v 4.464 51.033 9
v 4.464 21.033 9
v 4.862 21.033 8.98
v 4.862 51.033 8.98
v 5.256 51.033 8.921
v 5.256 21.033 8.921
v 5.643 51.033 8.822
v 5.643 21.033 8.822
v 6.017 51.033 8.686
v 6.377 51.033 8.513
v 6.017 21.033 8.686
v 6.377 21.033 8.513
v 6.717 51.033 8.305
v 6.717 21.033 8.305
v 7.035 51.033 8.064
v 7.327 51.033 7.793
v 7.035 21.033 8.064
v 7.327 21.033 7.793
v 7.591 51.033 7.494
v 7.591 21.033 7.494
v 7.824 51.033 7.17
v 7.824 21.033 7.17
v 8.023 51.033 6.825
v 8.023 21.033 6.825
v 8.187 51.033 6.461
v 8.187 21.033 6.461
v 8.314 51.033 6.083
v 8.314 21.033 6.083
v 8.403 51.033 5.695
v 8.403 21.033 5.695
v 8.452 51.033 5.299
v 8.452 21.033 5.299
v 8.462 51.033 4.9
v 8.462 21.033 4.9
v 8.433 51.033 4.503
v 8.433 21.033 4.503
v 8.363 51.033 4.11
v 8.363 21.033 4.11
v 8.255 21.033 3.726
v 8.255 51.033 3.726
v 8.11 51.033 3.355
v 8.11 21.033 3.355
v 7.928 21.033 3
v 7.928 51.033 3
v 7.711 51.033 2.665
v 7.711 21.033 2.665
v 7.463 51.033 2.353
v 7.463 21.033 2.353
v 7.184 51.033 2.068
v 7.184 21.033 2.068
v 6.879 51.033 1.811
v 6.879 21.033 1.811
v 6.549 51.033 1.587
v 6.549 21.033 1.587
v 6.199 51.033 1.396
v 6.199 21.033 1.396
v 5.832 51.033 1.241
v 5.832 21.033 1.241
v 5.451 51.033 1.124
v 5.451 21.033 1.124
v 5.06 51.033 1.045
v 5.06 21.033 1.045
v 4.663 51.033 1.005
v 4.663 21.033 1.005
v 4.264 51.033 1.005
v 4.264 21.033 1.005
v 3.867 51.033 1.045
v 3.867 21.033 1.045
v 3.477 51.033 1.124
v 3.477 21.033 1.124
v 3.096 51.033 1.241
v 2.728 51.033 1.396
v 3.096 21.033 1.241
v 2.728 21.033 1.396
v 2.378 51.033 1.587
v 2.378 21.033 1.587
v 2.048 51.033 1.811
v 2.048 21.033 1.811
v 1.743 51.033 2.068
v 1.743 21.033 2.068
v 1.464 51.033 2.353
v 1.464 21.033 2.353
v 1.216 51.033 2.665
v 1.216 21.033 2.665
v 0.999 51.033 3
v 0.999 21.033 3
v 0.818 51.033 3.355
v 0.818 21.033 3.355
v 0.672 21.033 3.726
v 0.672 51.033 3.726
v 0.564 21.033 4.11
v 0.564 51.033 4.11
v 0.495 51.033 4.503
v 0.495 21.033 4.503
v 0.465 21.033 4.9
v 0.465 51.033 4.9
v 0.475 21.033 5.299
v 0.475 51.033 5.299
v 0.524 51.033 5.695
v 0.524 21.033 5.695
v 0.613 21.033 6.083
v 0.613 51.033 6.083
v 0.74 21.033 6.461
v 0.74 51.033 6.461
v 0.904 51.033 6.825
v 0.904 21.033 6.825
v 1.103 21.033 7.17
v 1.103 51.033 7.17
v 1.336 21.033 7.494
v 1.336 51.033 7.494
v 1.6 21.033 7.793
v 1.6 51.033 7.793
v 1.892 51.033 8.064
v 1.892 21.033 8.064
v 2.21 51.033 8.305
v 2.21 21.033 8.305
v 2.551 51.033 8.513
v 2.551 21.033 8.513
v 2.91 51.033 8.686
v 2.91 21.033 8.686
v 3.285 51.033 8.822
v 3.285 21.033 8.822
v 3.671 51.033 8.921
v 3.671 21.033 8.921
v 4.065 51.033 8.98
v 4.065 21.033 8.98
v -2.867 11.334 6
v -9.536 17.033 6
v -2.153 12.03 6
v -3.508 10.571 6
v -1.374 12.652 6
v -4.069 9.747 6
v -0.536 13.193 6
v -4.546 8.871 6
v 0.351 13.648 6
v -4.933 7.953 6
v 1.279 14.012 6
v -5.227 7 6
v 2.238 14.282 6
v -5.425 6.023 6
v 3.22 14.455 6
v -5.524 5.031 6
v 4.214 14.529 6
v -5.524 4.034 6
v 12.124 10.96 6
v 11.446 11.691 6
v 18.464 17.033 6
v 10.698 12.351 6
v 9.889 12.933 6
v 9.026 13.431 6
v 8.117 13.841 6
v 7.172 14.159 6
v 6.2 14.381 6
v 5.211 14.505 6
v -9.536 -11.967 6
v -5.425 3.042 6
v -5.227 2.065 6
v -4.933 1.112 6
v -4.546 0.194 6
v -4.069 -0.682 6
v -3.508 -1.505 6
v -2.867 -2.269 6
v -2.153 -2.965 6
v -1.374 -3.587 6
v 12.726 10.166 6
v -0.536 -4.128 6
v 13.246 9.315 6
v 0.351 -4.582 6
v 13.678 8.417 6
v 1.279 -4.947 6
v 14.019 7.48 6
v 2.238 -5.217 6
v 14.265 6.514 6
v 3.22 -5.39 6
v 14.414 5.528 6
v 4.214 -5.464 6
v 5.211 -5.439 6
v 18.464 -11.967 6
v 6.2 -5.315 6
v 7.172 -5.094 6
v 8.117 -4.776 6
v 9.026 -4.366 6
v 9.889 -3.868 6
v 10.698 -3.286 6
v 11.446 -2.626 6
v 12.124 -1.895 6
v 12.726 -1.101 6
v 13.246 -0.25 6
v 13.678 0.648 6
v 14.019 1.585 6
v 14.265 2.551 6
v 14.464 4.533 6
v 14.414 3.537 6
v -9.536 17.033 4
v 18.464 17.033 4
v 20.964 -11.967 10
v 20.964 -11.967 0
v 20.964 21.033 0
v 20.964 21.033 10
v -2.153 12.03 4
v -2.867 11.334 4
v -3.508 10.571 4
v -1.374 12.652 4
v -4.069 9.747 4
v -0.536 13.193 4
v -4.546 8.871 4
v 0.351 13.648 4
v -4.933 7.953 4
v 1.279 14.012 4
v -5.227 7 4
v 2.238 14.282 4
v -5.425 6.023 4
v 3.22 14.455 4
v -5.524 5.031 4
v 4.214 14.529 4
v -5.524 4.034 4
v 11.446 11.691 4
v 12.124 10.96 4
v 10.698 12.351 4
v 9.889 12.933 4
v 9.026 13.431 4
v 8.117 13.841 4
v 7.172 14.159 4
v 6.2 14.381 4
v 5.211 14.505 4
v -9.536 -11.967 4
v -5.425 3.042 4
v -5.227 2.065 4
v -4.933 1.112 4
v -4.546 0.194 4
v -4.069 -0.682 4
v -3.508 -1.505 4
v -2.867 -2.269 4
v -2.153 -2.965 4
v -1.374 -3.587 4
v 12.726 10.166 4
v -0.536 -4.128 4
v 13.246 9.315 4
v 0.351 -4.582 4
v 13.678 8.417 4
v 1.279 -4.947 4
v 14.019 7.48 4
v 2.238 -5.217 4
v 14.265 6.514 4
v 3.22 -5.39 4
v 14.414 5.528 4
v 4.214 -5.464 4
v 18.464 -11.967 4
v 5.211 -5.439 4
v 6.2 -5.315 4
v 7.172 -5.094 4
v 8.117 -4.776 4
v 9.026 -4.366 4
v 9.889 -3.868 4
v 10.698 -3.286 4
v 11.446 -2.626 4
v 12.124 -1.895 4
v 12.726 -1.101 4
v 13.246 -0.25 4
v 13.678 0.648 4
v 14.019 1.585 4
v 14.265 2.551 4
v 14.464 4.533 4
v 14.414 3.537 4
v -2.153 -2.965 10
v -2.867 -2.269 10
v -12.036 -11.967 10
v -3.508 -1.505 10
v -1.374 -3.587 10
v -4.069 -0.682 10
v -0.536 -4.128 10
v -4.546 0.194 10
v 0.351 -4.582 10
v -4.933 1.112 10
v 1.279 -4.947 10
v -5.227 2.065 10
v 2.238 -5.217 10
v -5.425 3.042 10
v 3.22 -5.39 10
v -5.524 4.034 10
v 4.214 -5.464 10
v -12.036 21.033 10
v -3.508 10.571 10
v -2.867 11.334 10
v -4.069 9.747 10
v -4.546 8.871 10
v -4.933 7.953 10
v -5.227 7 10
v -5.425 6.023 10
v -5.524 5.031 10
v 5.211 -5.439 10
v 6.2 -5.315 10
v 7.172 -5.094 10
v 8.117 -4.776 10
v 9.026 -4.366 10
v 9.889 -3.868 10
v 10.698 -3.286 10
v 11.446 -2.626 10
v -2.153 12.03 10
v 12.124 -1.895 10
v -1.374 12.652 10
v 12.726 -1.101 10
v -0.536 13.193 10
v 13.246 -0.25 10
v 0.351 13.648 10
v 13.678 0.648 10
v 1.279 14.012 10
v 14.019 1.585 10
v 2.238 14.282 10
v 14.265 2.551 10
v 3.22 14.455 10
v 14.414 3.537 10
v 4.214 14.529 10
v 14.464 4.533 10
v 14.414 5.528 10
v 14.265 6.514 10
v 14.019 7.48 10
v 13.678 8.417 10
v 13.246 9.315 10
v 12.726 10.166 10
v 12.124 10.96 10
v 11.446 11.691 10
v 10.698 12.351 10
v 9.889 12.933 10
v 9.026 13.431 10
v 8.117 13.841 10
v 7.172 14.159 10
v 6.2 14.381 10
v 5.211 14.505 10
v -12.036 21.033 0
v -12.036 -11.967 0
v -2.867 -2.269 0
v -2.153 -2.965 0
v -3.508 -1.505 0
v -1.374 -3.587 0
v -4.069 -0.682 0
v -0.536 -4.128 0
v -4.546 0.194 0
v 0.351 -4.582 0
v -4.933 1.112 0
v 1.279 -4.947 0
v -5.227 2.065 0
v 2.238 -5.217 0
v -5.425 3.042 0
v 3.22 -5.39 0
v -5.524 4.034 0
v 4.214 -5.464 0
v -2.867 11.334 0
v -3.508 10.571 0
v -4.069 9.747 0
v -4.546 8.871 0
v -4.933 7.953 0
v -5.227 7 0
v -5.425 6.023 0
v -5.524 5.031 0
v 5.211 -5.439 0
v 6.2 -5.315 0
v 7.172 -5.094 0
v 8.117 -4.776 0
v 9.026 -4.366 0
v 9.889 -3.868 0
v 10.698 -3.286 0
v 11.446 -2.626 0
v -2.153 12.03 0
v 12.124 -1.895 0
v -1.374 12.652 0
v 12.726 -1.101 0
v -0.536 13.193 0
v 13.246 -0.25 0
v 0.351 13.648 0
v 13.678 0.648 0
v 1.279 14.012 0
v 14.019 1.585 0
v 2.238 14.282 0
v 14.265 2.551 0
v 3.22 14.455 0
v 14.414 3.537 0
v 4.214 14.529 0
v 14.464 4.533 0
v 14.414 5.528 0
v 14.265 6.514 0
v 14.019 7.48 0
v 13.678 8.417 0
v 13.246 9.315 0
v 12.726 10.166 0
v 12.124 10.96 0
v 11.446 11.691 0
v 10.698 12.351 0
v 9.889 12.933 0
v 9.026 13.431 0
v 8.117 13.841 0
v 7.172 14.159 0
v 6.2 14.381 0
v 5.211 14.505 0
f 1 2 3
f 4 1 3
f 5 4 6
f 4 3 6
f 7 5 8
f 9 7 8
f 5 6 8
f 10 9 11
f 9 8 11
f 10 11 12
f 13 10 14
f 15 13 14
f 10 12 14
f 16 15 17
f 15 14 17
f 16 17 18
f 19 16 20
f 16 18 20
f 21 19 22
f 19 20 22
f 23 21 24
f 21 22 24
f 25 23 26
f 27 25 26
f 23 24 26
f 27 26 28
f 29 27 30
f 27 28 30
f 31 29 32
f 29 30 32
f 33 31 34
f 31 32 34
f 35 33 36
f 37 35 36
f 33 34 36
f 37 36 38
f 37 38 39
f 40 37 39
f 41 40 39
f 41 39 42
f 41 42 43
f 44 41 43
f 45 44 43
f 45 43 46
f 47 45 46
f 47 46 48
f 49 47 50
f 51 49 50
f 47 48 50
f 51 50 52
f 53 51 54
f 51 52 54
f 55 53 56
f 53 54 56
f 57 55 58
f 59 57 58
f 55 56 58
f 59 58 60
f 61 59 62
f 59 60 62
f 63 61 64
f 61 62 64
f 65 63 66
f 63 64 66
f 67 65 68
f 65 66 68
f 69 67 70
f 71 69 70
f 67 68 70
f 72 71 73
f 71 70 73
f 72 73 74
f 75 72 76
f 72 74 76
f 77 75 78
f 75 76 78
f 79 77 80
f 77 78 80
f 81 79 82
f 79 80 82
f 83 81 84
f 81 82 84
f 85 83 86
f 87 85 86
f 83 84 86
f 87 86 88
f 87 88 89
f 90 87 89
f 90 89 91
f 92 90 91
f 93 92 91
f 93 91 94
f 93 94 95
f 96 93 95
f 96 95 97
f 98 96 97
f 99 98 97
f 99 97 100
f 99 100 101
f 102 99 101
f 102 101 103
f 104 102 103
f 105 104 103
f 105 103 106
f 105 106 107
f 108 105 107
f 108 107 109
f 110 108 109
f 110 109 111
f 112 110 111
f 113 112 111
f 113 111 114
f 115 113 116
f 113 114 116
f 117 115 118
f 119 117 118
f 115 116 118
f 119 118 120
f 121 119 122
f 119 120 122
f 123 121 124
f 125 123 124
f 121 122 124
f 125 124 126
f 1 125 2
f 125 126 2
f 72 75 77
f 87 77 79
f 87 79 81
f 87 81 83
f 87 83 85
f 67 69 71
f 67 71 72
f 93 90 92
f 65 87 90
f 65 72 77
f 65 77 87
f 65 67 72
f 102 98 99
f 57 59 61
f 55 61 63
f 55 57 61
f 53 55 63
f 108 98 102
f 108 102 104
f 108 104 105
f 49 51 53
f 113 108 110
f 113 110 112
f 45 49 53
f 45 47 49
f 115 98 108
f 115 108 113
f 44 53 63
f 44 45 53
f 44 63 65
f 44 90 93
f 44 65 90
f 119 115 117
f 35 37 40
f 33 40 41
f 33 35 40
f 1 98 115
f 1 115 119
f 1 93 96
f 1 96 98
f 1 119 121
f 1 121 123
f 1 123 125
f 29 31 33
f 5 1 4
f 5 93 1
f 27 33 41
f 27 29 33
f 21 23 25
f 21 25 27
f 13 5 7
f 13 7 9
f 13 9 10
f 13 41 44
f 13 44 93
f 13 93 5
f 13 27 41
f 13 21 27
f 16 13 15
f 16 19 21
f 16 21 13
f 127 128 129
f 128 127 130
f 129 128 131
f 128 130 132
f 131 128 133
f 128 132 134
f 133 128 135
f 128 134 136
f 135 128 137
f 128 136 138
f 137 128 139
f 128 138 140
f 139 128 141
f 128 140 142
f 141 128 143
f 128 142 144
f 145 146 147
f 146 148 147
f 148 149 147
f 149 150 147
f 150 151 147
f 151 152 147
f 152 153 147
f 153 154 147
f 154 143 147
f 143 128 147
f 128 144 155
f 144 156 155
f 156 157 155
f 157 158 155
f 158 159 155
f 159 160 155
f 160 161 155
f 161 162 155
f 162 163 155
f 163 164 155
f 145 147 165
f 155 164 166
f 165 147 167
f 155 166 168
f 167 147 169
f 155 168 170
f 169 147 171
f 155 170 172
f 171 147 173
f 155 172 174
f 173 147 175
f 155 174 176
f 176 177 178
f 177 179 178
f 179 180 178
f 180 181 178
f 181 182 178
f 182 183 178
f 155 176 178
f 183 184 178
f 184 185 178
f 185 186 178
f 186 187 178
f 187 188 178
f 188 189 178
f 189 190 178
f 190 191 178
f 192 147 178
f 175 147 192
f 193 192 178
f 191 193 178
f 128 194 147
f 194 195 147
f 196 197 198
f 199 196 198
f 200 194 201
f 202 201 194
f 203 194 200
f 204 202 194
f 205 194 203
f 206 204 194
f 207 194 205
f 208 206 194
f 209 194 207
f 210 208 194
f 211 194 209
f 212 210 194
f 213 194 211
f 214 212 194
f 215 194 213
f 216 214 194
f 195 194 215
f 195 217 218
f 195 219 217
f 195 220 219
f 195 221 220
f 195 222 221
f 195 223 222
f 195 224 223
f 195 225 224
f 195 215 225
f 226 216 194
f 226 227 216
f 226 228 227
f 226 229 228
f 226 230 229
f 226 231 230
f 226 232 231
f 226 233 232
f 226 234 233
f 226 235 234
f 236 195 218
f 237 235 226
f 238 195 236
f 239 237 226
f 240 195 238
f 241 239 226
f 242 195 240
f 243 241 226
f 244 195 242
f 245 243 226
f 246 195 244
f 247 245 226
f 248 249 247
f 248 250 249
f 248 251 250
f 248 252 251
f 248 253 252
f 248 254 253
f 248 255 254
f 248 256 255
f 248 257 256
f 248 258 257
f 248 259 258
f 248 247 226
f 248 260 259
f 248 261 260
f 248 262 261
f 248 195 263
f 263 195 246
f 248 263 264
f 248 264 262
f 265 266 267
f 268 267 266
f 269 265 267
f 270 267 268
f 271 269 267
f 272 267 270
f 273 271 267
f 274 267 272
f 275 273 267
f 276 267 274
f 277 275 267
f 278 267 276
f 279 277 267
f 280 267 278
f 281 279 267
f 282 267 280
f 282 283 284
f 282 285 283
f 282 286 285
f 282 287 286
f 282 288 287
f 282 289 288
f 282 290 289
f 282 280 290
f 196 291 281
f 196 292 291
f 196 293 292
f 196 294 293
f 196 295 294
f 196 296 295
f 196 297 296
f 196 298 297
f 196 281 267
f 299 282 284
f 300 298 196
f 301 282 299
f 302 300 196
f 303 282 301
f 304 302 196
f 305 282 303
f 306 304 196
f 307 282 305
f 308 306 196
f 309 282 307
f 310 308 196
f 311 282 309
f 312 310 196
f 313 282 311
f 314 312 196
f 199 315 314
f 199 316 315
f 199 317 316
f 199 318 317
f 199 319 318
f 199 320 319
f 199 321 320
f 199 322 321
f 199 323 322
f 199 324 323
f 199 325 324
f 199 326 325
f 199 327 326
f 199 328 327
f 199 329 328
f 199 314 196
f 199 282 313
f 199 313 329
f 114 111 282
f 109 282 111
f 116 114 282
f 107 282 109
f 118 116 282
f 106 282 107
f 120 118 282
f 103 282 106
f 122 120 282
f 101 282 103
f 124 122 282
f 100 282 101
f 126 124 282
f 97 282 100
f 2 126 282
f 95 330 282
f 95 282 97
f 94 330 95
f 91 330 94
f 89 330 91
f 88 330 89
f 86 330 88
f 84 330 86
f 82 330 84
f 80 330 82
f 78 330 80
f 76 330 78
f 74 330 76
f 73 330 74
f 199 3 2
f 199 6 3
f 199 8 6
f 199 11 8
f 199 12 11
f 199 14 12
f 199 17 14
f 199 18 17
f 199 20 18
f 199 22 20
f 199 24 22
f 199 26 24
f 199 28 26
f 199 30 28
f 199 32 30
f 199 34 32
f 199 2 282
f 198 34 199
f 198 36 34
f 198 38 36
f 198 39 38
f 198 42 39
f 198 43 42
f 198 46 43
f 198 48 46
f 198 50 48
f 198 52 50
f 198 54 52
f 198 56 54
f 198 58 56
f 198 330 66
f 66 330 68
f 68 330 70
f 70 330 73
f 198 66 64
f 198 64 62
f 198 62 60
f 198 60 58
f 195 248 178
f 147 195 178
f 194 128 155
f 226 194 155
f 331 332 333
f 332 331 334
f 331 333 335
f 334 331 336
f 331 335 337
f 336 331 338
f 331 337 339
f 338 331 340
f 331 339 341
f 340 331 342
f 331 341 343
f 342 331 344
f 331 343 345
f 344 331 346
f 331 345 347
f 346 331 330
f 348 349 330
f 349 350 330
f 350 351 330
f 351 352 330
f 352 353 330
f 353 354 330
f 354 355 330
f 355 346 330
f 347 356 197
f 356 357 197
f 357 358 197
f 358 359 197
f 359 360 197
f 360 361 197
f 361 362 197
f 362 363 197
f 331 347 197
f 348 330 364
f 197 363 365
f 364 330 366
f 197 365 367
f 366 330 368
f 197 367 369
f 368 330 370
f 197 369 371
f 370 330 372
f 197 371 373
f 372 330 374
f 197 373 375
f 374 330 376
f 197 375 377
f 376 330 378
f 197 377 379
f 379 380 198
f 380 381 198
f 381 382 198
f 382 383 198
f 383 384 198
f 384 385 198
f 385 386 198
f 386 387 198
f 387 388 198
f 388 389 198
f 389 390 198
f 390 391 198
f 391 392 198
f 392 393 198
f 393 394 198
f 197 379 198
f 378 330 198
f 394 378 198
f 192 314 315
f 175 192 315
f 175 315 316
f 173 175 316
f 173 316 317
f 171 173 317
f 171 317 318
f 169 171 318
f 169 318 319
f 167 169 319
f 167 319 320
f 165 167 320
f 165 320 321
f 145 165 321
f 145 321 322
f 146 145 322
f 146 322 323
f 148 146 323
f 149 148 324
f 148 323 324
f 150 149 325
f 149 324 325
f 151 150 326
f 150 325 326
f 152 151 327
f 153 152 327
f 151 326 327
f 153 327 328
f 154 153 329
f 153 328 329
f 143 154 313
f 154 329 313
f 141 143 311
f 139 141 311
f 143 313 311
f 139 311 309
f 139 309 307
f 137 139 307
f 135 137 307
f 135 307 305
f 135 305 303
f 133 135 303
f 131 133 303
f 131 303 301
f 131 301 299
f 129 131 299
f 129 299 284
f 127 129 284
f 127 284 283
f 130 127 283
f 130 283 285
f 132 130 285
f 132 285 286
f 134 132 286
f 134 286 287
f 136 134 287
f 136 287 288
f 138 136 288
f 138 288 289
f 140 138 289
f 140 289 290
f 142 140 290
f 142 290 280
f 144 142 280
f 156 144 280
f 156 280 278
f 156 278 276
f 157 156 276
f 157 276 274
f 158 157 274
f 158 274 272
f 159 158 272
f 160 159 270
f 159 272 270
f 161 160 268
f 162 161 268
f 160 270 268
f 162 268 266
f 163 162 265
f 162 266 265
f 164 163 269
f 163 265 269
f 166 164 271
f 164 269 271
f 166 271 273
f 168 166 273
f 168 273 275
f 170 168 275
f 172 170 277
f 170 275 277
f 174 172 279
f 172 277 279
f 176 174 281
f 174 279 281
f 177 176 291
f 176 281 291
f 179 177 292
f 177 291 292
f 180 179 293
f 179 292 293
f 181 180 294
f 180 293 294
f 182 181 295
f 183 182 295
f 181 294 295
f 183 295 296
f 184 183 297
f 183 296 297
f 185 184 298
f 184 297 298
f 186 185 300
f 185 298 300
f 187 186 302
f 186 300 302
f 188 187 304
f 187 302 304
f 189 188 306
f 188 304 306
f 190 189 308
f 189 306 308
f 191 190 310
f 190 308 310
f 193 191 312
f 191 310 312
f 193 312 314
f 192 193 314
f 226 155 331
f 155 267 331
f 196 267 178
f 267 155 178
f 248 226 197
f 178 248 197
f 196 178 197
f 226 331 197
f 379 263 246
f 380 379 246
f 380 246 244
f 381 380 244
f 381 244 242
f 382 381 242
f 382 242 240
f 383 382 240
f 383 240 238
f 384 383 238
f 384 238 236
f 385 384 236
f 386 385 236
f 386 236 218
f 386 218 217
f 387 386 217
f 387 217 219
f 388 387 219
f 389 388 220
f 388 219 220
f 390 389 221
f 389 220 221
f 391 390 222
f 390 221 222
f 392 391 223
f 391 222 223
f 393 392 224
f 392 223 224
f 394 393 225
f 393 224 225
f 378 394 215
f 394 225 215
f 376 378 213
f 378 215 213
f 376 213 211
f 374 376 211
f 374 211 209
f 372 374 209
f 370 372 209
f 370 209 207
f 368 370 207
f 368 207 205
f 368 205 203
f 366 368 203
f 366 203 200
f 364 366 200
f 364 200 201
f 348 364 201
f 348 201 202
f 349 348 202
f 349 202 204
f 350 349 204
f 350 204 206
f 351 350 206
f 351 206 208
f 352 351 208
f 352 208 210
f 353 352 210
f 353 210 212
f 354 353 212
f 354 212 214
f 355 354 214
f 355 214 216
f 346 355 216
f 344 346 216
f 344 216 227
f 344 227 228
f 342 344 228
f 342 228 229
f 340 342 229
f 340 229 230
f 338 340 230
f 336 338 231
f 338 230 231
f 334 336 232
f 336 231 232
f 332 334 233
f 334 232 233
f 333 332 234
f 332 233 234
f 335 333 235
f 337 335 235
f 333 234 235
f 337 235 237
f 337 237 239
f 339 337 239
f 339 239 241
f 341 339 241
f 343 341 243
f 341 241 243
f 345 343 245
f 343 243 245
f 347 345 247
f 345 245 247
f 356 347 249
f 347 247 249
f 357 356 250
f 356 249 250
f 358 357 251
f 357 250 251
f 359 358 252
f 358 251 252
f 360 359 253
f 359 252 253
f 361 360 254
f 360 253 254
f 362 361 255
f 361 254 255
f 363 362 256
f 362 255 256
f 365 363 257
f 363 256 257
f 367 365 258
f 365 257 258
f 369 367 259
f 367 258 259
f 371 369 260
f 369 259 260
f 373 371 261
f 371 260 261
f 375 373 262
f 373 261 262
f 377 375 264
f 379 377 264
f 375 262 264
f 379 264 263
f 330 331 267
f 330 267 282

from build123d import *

# Parameters (mm, degrees)
SKETCH1_W                 = 33
SKETCH1_H                 = 33
BOSS_EXTRUDE1_DEPTH       = 10
SHELL1_T                  = -4
SHELL1_THICKNESS_2_FACE_W = 2
SHELL1_THICKNESS_2_FACE_H = 29
SHELL1_THICKNESS_2_DEPTH  = 1.5
SHELL1_THICKNESS_3_FACE_W = 29
SHELL1_THICKNESS_3_FACE_H = 2
SHELL1_THICKNESS_3_DEPTH  = 1.5
SKETCH3_R                 = 10
CUT_EXTRUDE1_DEPTH        = 10
SKETCH5_R                 = 4
BOSS_EXTRUDE2_DEPTH       = 30


with BuildPart() as part:
    # Sketch1 → Boss-Extrude1 (new body)
    with BuildSketch(Plane.XY):
        with Locations((4.463597679, 4.532591876)):
            Rectangle(SKETCH1_W, SKETCH1_H)
    extrude(amount=BOSS_EXTRUDE1_DEPTH)

    # Shell1
    shell1_openings = [part.faces().sort_by_distance(p)[0] for p in [
        (4.463597679, -11.967408124, 5),
    ]]
    offset(amount=SHELL1_T, openings=shell1_openings, kind=Kind.INTERSECTION)

    # Shell1 thickness 2 face (on inner face of the shell) → Shell1 thickness 2 (cut)
    with BuildSketch(Plane(origin=(16.963597679, 2.532591876, 5), x_dir=(0, 0, 1), z_dir=(1, 0, 0))):
        Rectangle(SHELL1_THICKNESS_2_FACE_W, SHELL1_THICKNESS_2_FACE_H)
    extrude(amount=SHELL1_THICKNESS_2_DEPTH, mode=Mode.SUBTRACT)

    # Shell1 thickness 3 face (on inner face of the shell) → Shell1 thickness 3 (cut)
    with BuildSketch(Plane(origin=(-8.036402321, 2.532591876, 5), x_dir=(0, -1, 0), z_dir=(-1, 0, 0))):
        Rectangle(SHELL1_THICKNESS_3_FACE_W, SHELL1_THICKNESS_3_FACE_H)
    extrude(amount=SHELL1_THICKNESS_3_DEPTH, mode=Mode.SUBTRACT)

    # Sketch3 → Cut-Extrude1 (cut)
    with BuildSketch(Plane.XY.offset(10)):
        with Locations((4.463597679, 4.532591876)):
            Circle(SKETCH3_R)
    extrude(amount=-CUT_EXTRUDE1_DEPTH, mode=Mode.SUBTRACT)

    # Sketch5 → Boss-Extrude2 (add)
    with BuildSketch(Plane(origin=(0, 21.032591876, 0), x_dir=(1, 0, 0), z_dir=(0, 1, 0))):
        with Locations(Location((4.463597679, -5, 0), (0, 0, 270))):
            Circle(SKETCH5_R)
    extrude(amount=BOSS_EXTRUDE2_DEPTH)


solid = part.part
